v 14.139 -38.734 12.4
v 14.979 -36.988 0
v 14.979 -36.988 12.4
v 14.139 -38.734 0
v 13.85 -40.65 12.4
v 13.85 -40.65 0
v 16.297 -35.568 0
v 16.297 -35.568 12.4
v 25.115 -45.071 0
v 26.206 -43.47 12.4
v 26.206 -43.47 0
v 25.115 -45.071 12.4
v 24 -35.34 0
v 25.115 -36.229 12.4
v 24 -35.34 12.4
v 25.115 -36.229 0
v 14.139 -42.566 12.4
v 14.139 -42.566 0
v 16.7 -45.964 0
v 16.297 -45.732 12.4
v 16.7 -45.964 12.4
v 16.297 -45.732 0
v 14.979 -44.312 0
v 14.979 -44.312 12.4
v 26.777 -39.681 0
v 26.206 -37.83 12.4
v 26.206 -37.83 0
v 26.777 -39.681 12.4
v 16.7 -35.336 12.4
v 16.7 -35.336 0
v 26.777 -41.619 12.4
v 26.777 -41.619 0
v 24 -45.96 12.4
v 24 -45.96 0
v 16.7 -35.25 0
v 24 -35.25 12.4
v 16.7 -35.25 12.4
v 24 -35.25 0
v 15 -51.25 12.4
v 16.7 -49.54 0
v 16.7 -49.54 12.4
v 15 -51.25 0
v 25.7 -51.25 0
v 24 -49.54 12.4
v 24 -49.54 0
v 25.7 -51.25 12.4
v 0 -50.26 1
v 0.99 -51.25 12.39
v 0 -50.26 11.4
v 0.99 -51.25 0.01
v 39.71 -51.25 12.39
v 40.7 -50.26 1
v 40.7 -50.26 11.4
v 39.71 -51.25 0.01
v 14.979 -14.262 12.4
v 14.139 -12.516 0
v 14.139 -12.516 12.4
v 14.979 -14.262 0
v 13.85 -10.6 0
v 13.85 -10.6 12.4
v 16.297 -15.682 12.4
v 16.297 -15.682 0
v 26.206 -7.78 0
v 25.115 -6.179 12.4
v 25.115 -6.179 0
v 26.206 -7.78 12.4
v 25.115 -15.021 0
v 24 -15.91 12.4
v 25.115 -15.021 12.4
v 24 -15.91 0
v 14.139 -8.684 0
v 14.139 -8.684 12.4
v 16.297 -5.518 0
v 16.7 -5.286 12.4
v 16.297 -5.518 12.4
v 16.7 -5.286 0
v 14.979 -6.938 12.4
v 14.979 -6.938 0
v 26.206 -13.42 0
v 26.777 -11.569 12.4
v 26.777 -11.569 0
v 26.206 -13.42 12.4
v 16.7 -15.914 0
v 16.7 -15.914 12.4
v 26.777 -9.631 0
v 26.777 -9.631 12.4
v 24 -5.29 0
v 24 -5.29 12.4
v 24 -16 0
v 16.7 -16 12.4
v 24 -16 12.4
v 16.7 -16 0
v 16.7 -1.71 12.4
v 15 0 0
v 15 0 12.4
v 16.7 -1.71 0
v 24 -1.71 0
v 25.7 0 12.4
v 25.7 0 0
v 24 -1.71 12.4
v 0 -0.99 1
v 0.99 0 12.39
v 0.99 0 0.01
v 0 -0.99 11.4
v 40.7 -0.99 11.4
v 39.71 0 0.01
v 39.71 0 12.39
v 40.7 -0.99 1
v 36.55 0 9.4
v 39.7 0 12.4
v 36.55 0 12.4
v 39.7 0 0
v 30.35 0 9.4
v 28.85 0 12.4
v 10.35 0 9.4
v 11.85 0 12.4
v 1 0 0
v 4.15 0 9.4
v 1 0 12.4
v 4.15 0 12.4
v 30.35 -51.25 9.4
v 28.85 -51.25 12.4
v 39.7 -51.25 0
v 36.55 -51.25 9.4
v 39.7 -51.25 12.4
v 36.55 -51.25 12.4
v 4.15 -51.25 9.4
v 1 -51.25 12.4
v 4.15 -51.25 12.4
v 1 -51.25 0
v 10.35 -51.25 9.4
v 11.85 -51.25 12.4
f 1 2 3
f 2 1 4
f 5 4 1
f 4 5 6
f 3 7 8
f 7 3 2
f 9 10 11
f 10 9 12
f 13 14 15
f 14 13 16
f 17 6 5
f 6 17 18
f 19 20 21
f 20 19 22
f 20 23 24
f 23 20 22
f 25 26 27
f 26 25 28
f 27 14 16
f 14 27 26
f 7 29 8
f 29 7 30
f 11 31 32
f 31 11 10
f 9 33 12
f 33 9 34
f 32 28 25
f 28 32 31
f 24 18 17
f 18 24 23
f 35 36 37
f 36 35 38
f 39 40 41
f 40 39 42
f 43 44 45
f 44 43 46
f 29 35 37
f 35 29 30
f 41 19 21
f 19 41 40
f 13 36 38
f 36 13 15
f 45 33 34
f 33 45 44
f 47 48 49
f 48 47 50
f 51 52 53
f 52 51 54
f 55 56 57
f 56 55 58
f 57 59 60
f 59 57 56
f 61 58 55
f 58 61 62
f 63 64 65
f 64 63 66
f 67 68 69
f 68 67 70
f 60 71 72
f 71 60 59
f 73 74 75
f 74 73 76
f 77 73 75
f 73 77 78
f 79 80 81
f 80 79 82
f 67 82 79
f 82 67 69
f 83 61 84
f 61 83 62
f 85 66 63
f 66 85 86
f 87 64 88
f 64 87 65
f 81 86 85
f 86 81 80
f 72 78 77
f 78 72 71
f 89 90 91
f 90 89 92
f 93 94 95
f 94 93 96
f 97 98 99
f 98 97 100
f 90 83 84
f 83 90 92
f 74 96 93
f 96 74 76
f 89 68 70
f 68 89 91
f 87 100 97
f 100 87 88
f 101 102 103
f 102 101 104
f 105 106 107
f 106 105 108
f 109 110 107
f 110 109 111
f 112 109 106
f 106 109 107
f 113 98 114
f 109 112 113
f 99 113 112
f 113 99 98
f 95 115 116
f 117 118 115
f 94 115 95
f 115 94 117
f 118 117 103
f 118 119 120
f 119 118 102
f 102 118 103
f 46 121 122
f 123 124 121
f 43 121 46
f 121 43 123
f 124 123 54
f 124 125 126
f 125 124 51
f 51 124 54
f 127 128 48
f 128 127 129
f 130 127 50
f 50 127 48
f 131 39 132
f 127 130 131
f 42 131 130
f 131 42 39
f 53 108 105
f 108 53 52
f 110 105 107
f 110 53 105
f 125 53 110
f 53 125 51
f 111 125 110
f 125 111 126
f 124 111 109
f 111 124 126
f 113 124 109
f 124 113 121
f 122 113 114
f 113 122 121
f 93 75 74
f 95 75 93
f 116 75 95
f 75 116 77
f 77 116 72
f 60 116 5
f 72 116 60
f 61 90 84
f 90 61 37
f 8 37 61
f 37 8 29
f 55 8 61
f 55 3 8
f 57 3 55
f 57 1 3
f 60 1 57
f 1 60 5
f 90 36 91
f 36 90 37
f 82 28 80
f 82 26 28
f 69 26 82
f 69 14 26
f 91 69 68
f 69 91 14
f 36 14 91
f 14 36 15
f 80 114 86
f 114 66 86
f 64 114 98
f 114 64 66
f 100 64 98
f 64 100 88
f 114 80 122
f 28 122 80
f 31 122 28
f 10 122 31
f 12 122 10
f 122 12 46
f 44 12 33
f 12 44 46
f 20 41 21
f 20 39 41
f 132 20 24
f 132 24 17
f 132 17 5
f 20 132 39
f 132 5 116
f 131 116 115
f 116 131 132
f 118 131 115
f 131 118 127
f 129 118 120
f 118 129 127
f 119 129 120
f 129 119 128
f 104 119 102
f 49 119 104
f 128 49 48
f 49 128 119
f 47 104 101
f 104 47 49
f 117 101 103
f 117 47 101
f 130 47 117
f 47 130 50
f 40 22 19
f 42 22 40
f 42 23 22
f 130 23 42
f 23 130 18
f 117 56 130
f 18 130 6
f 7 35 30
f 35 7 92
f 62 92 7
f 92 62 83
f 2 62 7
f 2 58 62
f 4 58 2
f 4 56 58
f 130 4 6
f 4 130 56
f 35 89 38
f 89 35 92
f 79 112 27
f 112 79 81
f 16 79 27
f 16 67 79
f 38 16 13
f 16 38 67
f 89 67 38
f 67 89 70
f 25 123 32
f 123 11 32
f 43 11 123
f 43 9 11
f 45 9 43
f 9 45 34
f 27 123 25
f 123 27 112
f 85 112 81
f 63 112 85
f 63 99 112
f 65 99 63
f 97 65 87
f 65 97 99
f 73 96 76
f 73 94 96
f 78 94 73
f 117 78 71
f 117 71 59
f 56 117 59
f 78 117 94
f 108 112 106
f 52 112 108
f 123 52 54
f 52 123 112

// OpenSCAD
WIDTH=40.7;
HEIGHT=12.4;
LENGTH=205;
BEVEL=1;
TRACK_WIDTH=6.2;
TRACK_HEIGHT=3;
TRACK_DIST=20;
TRACK_CHAMFER = 1.5;

BRIDGE_HEIGHT=64;
BRIDGE_R1=214;
BRIDGE_R2=220;

CONN_WIDTH=7.3;
CONN_R=6.5;
CONN_BEVEL=1.7;
CONN_DEPTH=16;

ROUND_R=189;

SUPPORT_SIDE=7.2;
SUPPORT_THICK=33;
SUPPORT_WIDTH=WIDTH+1+2*SUPPORT_SIDE;

TUNNEL_R=28.5;
TUNNEL_H=65;
TUNNEL_LEN=135;
TUNNEL_THICK=2.1;
TUNNEL_SIDE_W=4.3;

CONN_LEN=31.6;
CONN_HEIGHT=11.5;

CONN_MALE_R=6;
CONN_MALE_W=6.5;
CONN_MALE_HOLE_Y=6.8;
CONN_MALE_HOLE_Z=6.4;
CONN_MALE_RIM=1;
CONN_MALE_PROTRUDE=0.75;
CONN_MALE_PROTRUDE_R=1.5;

CONN_FEMALE_R=5.6;
CONN_FEMALE_PROTRUDE_R=1.2;
CONN_FEMALE_THICK=1.6;
CONN_FEMALE_BRIDGE_L=6.5;
CONN_FEMALE_BRIDGE_W1=3.5;
CONN_FEMALE_BRIDGE_W2=4.5;
CONN_FEMALE_BRIDGE_RIM=CONN_FEMALE_BRIDGE_W2-CONN_FEMALE_BRIDGE_W1;
CONN_FEMALE_THICK=1.7;

module track_single() {
     //square([TRACK_WIDTH,TRACK_HEIGHT]);
     polygon(points=[[0,0],[TRACK_WIDTH,0],[TRACK_WIDTH+TRACK_CHAMFER,TRACK_HEIGHT],[0,TRACK_HEIGHT]]);
}

module track() {
    translate([WIDTH/2-TRACK_WIDTH-TRACK_DIST/2,HEIGHT-TRACK_HEIGHT,0])
	 track_single();

//translate([WIDTH/2-TRACK_WIDTH-TRACK_DIST/2,HEIGHT-TRACK_HEIGHT,0])
    #mirror([1,0,0]) translate([-WIDTH/2-TRACK_WIDTH-TRACK_DIST/2,HEIGHT-TRACK_HEIGHT,0])
	 track_single();
    
    /* translate([WIDTH/2+TRACK_DIST/2,HEIGHT-TRACK_HEIGHT,0]) */
    /*     track_single(); */
}

module body() {
     difference() {
        polygon(points=[[BEVEL,0],[WIDTH-BEVEL,0],[WIDTH,BEVEL],[WIDTH,HEIGHT-BEVEL],[WIDTH-BEVEL,HEIGHT],[BEVEL,HEIGHT],[0,HEIGHT-BEVEL],[0,BEVEL]]);
        translate([0,0,0.01])
            track();
    }
}

module brio_curved(r, parts) {
    translate([0,-r,0])
    difference() {
        rotate([0,0,-360/parts])
        difference() {
            rotate_extrude(convexity = 10, $fn=200)
            translate([r, 0, 0])
            difference() {
                body();
                translate([0,-HEIGHT+TRACK_HEIGHT,0])
                track();
            }
            translate([0,-500,-500])
            cube([1000,1000,1000]);
            translate([0,r+WIDTH/2,5*HEIGHT])
            mirror([1,0,0])
            rotate([90,0,0])
            connector();
        }

        translate([0,r+WIDTH/2,5*HEIGHT])
        rotate([90,0,0])
        connector();
        translate([-1000,-500,-500])
        cube([1000,1000,1000]);
    }
}

module round_quart() {
    intersection() {
        translate([0,0,WIDTH])
        rotate_extrude(convexity = 10, $fn = 200)
            translate([BRIDGE_R1, 0, 0])
            rotate([0,0,-90])
translate([0,-HEIGHT,0])
                body();

        cube([1000,1000,1000]);
    }
}

module round_quart_2() {
    intersection() {
        translate([0,0,WIDTH])
        rotate_extrude(convexity = 10, $fn = 200)
            translate([BRIDGE_R2, 0, 0])
            rotate([0,0,-90])
                mirror([0,1,0])
translate([0,-HEIGHT,0])
                body();

            cube([1000,1000,1000]);
    }
}


module curved_track() {
    intersection() {
        translate([0,-BRIDGE_R1+BRIDGE_HEIGHT,0])
        round_quart();
        cube([LENGTH/2,BRIDGE_HEIGHT,WIDTH]);
    }

    intersection() {
        translate([LENGTH,BRIDGE_R2+HEIGHT,0])
        mirror([1,1,0])
        round_quart_2();
        translate([LENGTH/2,0,0])
        cube([LENGTH/2,BRIDGE_HEIGHT,WIDTH]);
    } 
}

module bridge_hole_part(t, w,h,w2,h2) {
    hull() {
        cylinder(0.01,r=w/2);
        translate([0,0,t])
            cylinder(0.01,r=w2/2);
    }  
    hull() {
        translate([-w/2,0,0])
            cube([w,h-w/2,0.01]);
        translate([-w2/2,0,t])
            cube([w2,h2-w2/2,0.01]);
    } 
}

module bridge_hole(w,h) {
    mirror([0,1,0])
    translate([0,-h+w/2+0.01,BEVEL]) {
        bridge_hole_part(WIDTH-2*BEVEL,w,h,w,h);
        translate([0,0,-BEVEL])
            bridge_hole_part(BEVEL,w+BEVEL,h+BEVEL,w,h);
        translate([0,0,WIDTH-2*BEVEL])
            bridge_hole_part(BEVEL,w,h,w+BEVEL,h+BEVEL); 
    }
}

module bridge_body() {
    curved_track();
    intersection() {
    translate([0,-BRIDGE_R2+BRIDGE_HEIGHT-HEIGHT/2,0])
    cylinder(WIDTH,r=BRIDGE_R2, $fn=200);
    translate([0,BEVEL,0])
    cube([LENGTH,BRIDGE_HEIGHT,WIDTH]);
    }
    translate([0,BEVEL,0])
    cube([LENGTH,HEIGHT-TRACK_HEIGHT-BEVEL,WIDTH]);
    translate([130,BEVEL,0])
    cube([25,HEIGHT,WIDTH]);
    hull() {
        translate([0,0,BEVEL])
        cube([LENGTH,0.01,WIDTH-2*BEVEL]);
        translate([0,BEVEL,0])
        cube([LENGTH,0.01,WIDTH]);
    }
}

module brio_bridge() {
    rotate([90,0,-90])
    difference() {
        bridge_body();
        translate([84,0,0])
        bridge_hole(44.5,30);
        bridge_hole(68,BRIDGE_HEIGHT-HEIGHT);
        translate([-0.01,9*HEIGHT,WIDTH/2])
        connector();
        translate([LENGTH+0.01,9*HEIGHT,WIDTH/2])
        mirror([1,0,0])
        connector();
    }
}

module conn_bevel() {
    translate([WIDTH/2-BEVEL,0,0])
    linear_extrude(height=10*HEIGHT)
        polygon(points=[[0,-0.01],[BEVEL+0.01,BEVEL],[BEVEL+0.01,-0.01]]);
}
module connector() {
    rotate([90,90,0])
    {
    hull() {
        translate([-(CONN_WIDTH+2*CONN_BEVEL)/2,-0.01,0])
            cube([CONN_WIDTH+2*CONN_BEVEL, 0.01, 10*HEIGHT]);
        translate([-CONN_WIDTH/2,CONN_BEVEL,0])
            cube([CONN_WIDTH, 0.01, 10*HEIGHT]);
    }
    translate([-CONN_WIDTH/2,0,0])
        cube([CONN_WIDTH, CONN_DEPTH, 10*HEIGHT]);

    difference() {
        translate([0,CONN_DEPTH-CONN_R+1.1,0])
            cylinder(10*HEIGHT,r=CONN_R);
        translate([-CONN_WIDTH/2,CONN_DEPTH,0])
            cube([CONN_WIDTH, CONN_DEPTH, 10*HEIGHT]);
    }

    conn_bevel();
    mirror([1,0,0])
        conn_bevel();

    } 
}

module brio_straight(len) {
    rotate([90,0,0])
    difference() {
        linear_extrude(height=len)
            body();
        translate([WIDTH/2,5*HEIGHT,len])
        rotate([0,90,0])
            connector();
        mirror([0,0,1])
        translate([WIDTH/2,5*HEIGHT,0])
        rotate([0,90,0])
            connector();
    }
}

module brio_cross(len) {
    difference() {
        union() {
            translate([-WIDTH/2,len/2,0])
                brio_straight(len);
            rotate([0,0,90])
                translate([-WIDTH/2,len/2,0])
                    brio_straight(len);
        }
        translate([-len,-WIDTH/2,0.01])
            rotate([90,0,90])
                linear_extrude(height=len*2)
                    track();
        translate([-WIDTH/2,len,0.01]) 
            rotate([90,0,0])
                linear_extrude(height=len*2)
                    track();
    }
}

module brick_6_track() {
    translate([0,-0.01,0])
    rotate([90,0,0])
    linear_extrude(height=LENGTH+0.02)
        track();
    translate([-ROUND_R,0,0])
    rotate_extrude(convexity = 10, $fn = 200)
    translate([ROUND_R, 0, 0])
        track();
}

module brio_splitter() {
    difference() {
        union() {
            brio_straight((3/4)*LENGTH);
            rotate([0,0,-90])
            brio_curved(ROUND_R, 8);
        }
        translate([0,0,0.01])
        brick_6_track();
        translate([0,0,-HEIGHT+TRACK_HEIGHT-0.01])
        brick_6_track();
    }

}

module brick_6_track_round() {
    cube([1,1,1]);

    translate([-ROUND_R,0,0])
    rotate_extrude(convexity = 10, $fn = 200)
    translate([ROUND_R, 0, 0])
        track();

    translate([WIDTH,0,0])
    mirror([1,0,0])
    translate([-ROUND_R,0,0])
    rotate_extrude(convexity = 10, $fn = 200)
    translate([ROUND_R, 0, 0])
        track();
}

module brio_splitter_round() {
    difference() {
        union() {
//            brio_straight((3/4)*LENGTH);
 //           rotate([0,0,-90])
//            brio_curved(ROUND_R, 8*3/2);
            rotate([0,0,-90])
            brio_curved(ROUND_R, 8*3/2);
            translate([WIDTH,0,0])
            mirror([1,0,0])
            rotate([0,0,-90])
            brio_curved(ROUND_R, 8*3/2);
        }
        translate([0,0,0.01])
        brick_6_track_round();
        translate([0,0,-HEIGHT+TRACK_HEIGHT-0.01])
        brick_6_track_round();
    }

}
module support_halve() {
    linear_extrude(height=SUPPORT_THICK)
        polygon(points=[[0,HEIGHT-BEVEL],[WIDTH/2+0.5,HEIGHT-BEVEL],[WIDTH/2+0.5,BEVEL],[WIDTH/2+0.5+BEVEL,0],[SUPPORT_WIDTH/2-BEVEL,0],[SUPPORT_WIDTH/2,BEVEL],[SUPPORT_WIDTH/2,BRIDGE_HEIGHT-HEIGHT-BEVEL],[SUPPORT_WIDTH/2-BEVEL,BRIDGE_HEIGHT-HEIGHT],[WIDTH/2,BRIDGE_HEIGHT-HEIGHT],[WIDTH/2,BRIDGE_HEIGHT-2*BEVEL],[WIDTH/2-BEVEL,BRIDGE_HEIGHT-BEVEL],[0,BRIDGE_HEIGHT-BEVEL]]);
}

module brio_support() {
    translate([0,-BRIDGE_HEIGHT-BEVEL,0]) {
        support_halve();
        mirror([1,0,0])
            support_halve();
    }
}

module tunnel_shape(sub) {
    translate([TUNNEL_H-TUNNEL_R,0,0])
        circle(TUNNEL_R-sub, $fn=200);
    translate([0,-TUNNEL_R+sub,0])
        square([TUNNEL_H-TUNNEL_R,TUNNEL_R*2-2*sub]);
}

module tunnel_halve_neg() {
    translate([0,0,0])
        linear_extrude(height=TUNNEL_THICK)
            tunnel_shape(2*TUNNEL_THICK);
    hull() {
        translate([0,0,TUNNEL_THICK])
            linear_extrude(height=0.01)
                tunnel_shape(2*TUNNEL_THICK);
        translate([0,0,2*TUNNEL_THICK])
            linear_extrude(height=0.01)
                tunnel_shape(TUNNEL_THICK);
    }
    translate([0,0,2*TUNNEL_THICK])
        linear_extrude(height=TUNNEL_LEN/2-2*TUNNEL_THICK+0.01)
            tunnel_shape(TUNNEL_THICK);
}

module tunnel_halve_pos() {
    linear_extrude(height=TUNNEL_LEN/2)
        tunnel_shape(0);
}

module tunnel_halve() {
    translate([0,0,-TUNNEL_LEN/2]) {
        difference() {
            tunnel_halve_pos();
            tunnel_halve_neg();
        }
        translate([0,TUNNEL_R-TUNNEL_THICK,0])
            linear_extrude(height=TUNNEL_LEN/2)
                square([TUNNEL_THICK, TUNNEL_SIDE_W]);
        translate([0,-TUNNEL_R+TUNNEL_THICK-TUNNEL_SIDE_W,0])
            linear_extrude(height=TUNNEL_LEN/2)
                square([TUNNEL_THICK, TUNNEL_SIDE_W]);
    }
}

module brio_tunnel() {
    translate([0,-TUNNEL_LEN/2,0])
    mirror([0,0,1])
    rotate([90,90,0]) {
        tunnel_halve();
        mirror([0,0,1])
            tunnel_halve();
    }
}

module connector_male_protrude() {
    translate([0,CONN_MALE_R-CONN_MALE_PROTRUDE_R+CONN_MALE_PROTRUDE,0])
        cylinder((CONN_HEIGHT-2*CONN_MALE_RIM)/2,r=CONN_MALE_PROTRUDE_R,$fn=20);
}

module connector_male_end(len) {
    difference() {
        intersection() {
            translate([0,50,0])
                cube([100,100,100],center=true);
            union() {
                translate([0,0,CONN_HEIGHT/2-CONN_MALE_RIM])
                    hull() {
                        cylinder(0.01, r=CONN_MALE_R, $fn=20);
                        translate([0,0,CONN_MALE_RIM])
                            cylinder(0.01, r=CONN_MALE_R-CONN_MALE_RIM, $fn=20);
                    }
                cylinder(CONN_HEIGHT/2-CONN_MALE_RIM, r=CONN_MALE_R, $fn=20);
                rotate([0,0,40])
                    connector_male_protrude();
                rotate([0,0,-40])
                    connector_male_protrude();
            }
        }
        translate([-CONN_MALE_R/2,0,0])
            cube([CONN_MALE_R,CONN_MALE_HOLE_Y,CONN_MALE_HOLE_Z],center=true);
    }
}

module connector_male_bridge(len) {
    hull() {
        cube([len-CONN_MALE_R,0.01,CONN_HEIGHT/2], center=true);
        translate([0,CONN_MALE_RIM,-CONN_MALE_RIM/2])
            cube([len-CONN_MALE_R-2*CONN_MALE_RIM,0.01,CONN_HEIGHT/2-CONN_MALE_RIM], center=true);
    }
    translate([0,-(CONN_MALE_W-2*CONN_MALE_RIM)/4,0])
        cube([len-CONN_MALE_R,(CONN_MALE_W-2*CONN_MALE_RIM)/2,CONN_HEIGHT/2], center=true);
}

module connector_male_quart(len) {
    connector_male_end(len);
    translate([(len-CONN_MALE_R)/2,CONN_MALE_W/2-CONN_MALE_RIM,CONN_HEIGHT/4])
        connector_male_bridge(len);
}

module connector_male(len) {
    translate([-len+CONN_MALE_R,0,0]) {
        connector_male_quart(len);
        mirror([0,0,1])
            connector_male_quart(len);
        mirror([0,1,0]) {
            connector_male_quart(len);
            mirror([0,0,1])
                connector_male_quart(len);
        }
    }
}

module connector_female_end(len) {
    difference() {
        intersection() {
            translate([0,50,0])
                cube([100,100,100],center=true);
            difference() {
                cylinder(CONN_HEIGHT/2, r=CONN_FEMALE_R, $fn=20);
                rotate([0,0,38])
                    translate([-CONN_FEMALE_R/2,CONN_FEMALE_R,0])
                        cube([CONN_FEMALE_R,CONN_FEMALE_R*2,CONN_HEIGHT], center=true);
                minkowski() {
                    intersection() {
                        translate([0,50+CONN_FEMALE_BRIDGE_W1/2+CONN_FEMALE_THICK/2,0])
                            cube([100,100,100],center=true);
                        cylinder(CONN_HEIGHT/2,r=CONN_FEMALE_R-3*CONN_FEMALE_THICK/2,$fn=20);
                    }
                    cylinder(CONN_FEMALE_THICK,r=CONN_FEMALE_THICK/2,$fn=20);
                }
            }
        }
    }
    rotate([0,0,38])
        translate([0,CONN_FEMALE_R-CONN_FEMALE_PROTRUDE_R,0])
            cylinder(CONN_HEIGHT/2,r=CONN_FEMALE_PROTRUDE_R, $fn=20);

}

module connector_female_bridge(len) {
    translate([0,0,CONN_HEIGHT/4]) {
        translate([(len-CONN_FEMALE_THICK/2)/2,CONN_FEMALE_BRIDGE_W1/4,0])
            cube([len-CONN_FEMALE_THICK/2,CONN_FEMALE_BRIDGE_W1/2,CONN_HEIGHT/2],center=true);
        hull() {
            translate([(CONN_FEMALE_BRIDGE_L+CONN_FEMALE_BRIDGE_RIM)/2,CONN_FEMALE_BRIDGE_W1/2,0])
                cube([CONN_FEMALE_BRIDGE_L+CONN_FEMALE_BRIDGE_RIM,0.01,CONN_HEIGHT/2],center=true);
            translate([CONN_FEMALE_BRIDGE_L/2,CONN_FEMALE_BRIDGE_W2/2,0])
                cube([CONN_FEMALE_BRIDGE_L,0.01,CONN_HEIGHT/2],center=true);
        }
    }

}

module connector_female_quart(len) {
    translate([len-CONN_FEMALE_R,0,0])
        connector_female_end(len);
    connector_female_bridge(len);
}

module connector_female(len) {
        connector_female_quart(len);
        mirror([0,0,1])
            connector_female_quart(len);
        mirror([0,1,0]) {
            connector_female_quart(len);
            mirror([0,0,1])
                connector_female_quart(len);
        }
}

module brio_connector(len) {
    connector_male(len/2);
    connector_female(len/2);
}

//brio_straight(LENGTH);
//brio_straight((3/4)*LENGTH);
//brio_straight((1/2)*LENGTH);
brio_straight((1/4)*LENGTH);
//brio_curved(ROUND_R, 8); // inner radius, Nth part
//brio_curved(ROUND_R, 16); // inner radius, Nth part
//brio_bridge();
//brio_cross(LENGTH/2);
//brio_splitter();
//brio_splitter_round();
//brio_support();
//brio_tunnel();
//brio_connector(CONN_LEN);
